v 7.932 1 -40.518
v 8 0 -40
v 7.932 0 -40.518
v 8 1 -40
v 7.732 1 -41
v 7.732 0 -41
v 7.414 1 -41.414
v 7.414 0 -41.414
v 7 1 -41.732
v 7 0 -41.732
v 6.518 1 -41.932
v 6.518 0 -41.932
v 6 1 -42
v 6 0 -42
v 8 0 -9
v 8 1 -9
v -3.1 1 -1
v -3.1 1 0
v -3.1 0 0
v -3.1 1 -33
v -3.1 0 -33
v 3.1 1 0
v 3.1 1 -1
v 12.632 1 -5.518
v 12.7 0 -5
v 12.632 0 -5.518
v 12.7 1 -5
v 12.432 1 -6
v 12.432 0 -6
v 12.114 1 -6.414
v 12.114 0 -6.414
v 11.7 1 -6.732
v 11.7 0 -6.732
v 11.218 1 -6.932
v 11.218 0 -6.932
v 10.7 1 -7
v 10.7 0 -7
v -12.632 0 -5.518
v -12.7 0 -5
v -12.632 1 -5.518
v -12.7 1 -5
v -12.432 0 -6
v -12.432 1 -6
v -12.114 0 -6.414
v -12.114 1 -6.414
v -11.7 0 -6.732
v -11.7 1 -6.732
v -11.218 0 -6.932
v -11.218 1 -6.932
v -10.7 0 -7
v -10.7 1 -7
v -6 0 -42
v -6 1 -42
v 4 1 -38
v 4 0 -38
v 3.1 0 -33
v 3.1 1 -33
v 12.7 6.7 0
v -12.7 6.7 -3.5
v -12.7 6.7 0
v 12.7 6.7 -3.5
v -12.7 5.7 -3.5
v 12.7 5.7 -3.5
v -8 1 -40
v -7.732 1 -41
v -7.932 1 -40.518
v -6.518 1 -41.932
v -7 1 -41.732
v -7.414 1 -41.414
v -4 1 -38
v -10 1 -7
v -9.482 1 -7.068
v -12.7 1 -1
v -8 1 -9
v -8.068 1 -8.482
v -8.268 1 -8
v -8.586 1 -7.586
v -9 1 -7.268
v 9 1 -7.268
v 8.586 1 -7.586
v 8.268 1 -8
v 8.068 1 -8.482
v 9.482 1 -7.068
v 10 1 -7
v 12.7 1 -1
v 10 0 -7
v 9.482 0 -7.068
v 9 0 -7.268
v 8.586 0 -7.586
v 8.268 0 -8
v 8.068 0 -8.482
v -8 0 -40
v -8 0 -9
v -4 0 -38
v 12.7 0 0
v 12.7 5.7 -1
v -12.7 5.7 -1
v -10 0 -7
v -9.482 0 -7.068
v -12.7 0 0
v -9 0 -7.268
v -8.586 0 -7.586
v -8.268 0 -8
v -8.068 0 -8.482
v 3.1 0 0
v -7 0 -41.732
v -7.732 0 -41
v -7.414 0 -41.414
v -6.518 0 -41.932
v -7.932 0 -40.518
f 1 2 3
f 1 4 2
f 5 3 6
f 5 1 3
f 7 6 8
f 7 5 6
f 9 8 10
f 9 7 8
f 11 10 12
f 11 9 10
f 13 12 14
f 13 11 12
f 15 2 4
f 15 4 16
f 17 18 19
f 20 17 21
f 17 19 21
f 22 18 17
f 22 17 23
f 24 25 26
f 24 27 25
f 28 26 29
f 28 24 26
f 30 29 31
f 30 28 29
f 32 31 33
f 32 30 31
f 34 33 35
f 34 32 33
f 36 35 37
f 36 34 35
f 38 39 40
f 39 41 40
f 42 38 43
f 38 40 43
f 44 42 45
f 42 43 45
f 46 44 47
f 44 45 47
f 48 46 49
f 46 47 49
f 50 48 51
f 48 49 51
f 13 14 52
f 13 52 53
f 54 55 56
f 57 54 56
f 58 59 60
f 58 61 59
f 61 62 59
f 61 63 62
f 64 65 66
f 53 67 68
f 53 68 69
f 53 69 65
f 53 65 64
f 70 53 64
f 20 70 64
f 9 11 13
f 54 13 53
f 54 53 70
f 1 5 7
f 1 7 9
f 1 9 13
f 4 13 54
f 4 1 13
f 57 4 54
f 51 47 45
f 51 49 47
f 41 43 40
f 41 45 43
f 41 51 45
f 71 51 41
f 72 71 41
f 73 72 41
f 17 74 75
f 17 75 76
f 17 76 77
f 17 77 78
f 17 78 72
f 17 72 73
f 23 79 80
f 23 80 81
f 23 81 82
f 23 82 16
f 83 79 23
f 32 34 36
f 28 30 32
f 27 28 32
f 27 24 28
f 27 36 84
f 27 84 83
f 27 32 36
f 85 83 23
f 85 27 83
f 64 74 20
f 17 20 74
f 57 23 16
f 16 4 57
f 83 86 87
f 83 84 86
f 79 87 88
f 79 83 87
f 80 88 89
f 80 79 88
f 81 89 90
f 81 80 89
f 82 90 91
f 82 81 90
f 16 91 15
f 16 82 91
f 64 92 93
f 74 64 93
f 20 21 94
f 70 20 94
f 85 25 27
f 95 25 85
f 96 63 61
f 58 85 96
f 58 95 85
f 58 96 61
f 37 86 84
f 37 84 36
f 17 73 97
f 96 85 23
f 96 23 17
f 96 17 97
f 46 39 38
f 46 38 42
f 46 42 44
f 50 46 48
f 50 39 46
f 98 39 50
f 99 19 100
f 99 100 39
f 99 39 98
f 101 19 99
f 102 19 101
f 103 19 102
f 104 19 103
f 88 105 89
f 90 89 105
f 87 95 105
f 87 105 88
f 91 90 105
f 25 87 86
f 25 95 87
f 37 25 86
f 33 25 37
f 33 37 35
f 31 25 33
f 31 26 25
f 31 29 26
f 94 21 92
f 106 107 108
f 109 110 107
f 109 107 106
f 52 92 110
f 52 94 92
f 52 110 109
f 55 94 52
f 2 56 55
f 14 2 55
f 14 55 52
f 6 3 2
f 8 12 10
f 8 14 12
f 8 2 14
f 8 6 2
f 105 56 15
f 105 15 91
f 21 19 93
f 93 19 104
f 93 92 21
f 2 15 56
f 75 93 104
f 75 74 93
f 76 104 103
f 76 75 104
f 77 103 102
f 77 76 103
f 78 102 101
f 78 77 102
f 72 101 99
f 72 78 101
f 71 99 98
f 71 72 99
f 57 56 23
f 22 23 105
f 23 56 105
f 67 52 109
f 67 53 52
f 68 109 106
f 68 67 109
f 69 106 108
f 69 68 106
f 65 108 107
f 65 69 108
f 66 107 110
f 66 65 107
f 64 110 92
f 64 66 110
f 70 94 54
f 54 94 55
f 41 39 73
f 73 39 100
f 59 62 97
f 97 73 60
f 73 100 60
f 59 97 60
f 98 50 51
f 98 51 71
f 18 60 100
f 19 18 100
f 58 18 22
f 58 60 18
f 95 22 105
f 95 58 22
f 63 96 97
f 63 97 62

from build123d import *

# Parameters (mm, degrees)
F1_DEPTH = 12.7
F2_W     = 4.7
F2_H     = 35
F3_DEPTH = 1
F4_R     = 2


with BuildPart() as f1:
    # F0 (on Right) → F1 (new body, symmetric)
    with BuildSketch(Plane.YZ):
        Polygon((6.7, 0), (0, 0), (0, -42), (1, -42), (1, -1), (5.7, -1), (5.7, -3.5), (6.7, -3.5), align=None)
    extrude(amount=F1_DEPTH, both=True)

    # F2 (on face) → F3 (cut, through all)
    with BuildSketch(Plane.XZ):
        Polygon((3.1, 0), (-3.1, 0), (-3.1, -33), (-4, -38), (4, -38), (3.1, -33), align=None)
        with Locations((-10.35, -24.5)):
            Rectangle(F2_W, F2_H)
        with Locations((10.35, -24.5)):
            Rectangle(F2_W, F2_H)
    extrude(amount=-F3_DEPTH, mode=Mode.SUBTRACT)

    # F4
    f4_edges = [f1.edges().sort_by_distance(p)[0] for p in [
        (8, 0.5, -42),
        (-8, 0.5, -42),
        (-8, 0.5, -7),
        (-12.7, 0.5, -7),
        (8, 0.5, -7),
        (12.7, 0.5, -7),
    ]]
    fillet(f4_edges, radius=F4_R)


solid = f1.part
